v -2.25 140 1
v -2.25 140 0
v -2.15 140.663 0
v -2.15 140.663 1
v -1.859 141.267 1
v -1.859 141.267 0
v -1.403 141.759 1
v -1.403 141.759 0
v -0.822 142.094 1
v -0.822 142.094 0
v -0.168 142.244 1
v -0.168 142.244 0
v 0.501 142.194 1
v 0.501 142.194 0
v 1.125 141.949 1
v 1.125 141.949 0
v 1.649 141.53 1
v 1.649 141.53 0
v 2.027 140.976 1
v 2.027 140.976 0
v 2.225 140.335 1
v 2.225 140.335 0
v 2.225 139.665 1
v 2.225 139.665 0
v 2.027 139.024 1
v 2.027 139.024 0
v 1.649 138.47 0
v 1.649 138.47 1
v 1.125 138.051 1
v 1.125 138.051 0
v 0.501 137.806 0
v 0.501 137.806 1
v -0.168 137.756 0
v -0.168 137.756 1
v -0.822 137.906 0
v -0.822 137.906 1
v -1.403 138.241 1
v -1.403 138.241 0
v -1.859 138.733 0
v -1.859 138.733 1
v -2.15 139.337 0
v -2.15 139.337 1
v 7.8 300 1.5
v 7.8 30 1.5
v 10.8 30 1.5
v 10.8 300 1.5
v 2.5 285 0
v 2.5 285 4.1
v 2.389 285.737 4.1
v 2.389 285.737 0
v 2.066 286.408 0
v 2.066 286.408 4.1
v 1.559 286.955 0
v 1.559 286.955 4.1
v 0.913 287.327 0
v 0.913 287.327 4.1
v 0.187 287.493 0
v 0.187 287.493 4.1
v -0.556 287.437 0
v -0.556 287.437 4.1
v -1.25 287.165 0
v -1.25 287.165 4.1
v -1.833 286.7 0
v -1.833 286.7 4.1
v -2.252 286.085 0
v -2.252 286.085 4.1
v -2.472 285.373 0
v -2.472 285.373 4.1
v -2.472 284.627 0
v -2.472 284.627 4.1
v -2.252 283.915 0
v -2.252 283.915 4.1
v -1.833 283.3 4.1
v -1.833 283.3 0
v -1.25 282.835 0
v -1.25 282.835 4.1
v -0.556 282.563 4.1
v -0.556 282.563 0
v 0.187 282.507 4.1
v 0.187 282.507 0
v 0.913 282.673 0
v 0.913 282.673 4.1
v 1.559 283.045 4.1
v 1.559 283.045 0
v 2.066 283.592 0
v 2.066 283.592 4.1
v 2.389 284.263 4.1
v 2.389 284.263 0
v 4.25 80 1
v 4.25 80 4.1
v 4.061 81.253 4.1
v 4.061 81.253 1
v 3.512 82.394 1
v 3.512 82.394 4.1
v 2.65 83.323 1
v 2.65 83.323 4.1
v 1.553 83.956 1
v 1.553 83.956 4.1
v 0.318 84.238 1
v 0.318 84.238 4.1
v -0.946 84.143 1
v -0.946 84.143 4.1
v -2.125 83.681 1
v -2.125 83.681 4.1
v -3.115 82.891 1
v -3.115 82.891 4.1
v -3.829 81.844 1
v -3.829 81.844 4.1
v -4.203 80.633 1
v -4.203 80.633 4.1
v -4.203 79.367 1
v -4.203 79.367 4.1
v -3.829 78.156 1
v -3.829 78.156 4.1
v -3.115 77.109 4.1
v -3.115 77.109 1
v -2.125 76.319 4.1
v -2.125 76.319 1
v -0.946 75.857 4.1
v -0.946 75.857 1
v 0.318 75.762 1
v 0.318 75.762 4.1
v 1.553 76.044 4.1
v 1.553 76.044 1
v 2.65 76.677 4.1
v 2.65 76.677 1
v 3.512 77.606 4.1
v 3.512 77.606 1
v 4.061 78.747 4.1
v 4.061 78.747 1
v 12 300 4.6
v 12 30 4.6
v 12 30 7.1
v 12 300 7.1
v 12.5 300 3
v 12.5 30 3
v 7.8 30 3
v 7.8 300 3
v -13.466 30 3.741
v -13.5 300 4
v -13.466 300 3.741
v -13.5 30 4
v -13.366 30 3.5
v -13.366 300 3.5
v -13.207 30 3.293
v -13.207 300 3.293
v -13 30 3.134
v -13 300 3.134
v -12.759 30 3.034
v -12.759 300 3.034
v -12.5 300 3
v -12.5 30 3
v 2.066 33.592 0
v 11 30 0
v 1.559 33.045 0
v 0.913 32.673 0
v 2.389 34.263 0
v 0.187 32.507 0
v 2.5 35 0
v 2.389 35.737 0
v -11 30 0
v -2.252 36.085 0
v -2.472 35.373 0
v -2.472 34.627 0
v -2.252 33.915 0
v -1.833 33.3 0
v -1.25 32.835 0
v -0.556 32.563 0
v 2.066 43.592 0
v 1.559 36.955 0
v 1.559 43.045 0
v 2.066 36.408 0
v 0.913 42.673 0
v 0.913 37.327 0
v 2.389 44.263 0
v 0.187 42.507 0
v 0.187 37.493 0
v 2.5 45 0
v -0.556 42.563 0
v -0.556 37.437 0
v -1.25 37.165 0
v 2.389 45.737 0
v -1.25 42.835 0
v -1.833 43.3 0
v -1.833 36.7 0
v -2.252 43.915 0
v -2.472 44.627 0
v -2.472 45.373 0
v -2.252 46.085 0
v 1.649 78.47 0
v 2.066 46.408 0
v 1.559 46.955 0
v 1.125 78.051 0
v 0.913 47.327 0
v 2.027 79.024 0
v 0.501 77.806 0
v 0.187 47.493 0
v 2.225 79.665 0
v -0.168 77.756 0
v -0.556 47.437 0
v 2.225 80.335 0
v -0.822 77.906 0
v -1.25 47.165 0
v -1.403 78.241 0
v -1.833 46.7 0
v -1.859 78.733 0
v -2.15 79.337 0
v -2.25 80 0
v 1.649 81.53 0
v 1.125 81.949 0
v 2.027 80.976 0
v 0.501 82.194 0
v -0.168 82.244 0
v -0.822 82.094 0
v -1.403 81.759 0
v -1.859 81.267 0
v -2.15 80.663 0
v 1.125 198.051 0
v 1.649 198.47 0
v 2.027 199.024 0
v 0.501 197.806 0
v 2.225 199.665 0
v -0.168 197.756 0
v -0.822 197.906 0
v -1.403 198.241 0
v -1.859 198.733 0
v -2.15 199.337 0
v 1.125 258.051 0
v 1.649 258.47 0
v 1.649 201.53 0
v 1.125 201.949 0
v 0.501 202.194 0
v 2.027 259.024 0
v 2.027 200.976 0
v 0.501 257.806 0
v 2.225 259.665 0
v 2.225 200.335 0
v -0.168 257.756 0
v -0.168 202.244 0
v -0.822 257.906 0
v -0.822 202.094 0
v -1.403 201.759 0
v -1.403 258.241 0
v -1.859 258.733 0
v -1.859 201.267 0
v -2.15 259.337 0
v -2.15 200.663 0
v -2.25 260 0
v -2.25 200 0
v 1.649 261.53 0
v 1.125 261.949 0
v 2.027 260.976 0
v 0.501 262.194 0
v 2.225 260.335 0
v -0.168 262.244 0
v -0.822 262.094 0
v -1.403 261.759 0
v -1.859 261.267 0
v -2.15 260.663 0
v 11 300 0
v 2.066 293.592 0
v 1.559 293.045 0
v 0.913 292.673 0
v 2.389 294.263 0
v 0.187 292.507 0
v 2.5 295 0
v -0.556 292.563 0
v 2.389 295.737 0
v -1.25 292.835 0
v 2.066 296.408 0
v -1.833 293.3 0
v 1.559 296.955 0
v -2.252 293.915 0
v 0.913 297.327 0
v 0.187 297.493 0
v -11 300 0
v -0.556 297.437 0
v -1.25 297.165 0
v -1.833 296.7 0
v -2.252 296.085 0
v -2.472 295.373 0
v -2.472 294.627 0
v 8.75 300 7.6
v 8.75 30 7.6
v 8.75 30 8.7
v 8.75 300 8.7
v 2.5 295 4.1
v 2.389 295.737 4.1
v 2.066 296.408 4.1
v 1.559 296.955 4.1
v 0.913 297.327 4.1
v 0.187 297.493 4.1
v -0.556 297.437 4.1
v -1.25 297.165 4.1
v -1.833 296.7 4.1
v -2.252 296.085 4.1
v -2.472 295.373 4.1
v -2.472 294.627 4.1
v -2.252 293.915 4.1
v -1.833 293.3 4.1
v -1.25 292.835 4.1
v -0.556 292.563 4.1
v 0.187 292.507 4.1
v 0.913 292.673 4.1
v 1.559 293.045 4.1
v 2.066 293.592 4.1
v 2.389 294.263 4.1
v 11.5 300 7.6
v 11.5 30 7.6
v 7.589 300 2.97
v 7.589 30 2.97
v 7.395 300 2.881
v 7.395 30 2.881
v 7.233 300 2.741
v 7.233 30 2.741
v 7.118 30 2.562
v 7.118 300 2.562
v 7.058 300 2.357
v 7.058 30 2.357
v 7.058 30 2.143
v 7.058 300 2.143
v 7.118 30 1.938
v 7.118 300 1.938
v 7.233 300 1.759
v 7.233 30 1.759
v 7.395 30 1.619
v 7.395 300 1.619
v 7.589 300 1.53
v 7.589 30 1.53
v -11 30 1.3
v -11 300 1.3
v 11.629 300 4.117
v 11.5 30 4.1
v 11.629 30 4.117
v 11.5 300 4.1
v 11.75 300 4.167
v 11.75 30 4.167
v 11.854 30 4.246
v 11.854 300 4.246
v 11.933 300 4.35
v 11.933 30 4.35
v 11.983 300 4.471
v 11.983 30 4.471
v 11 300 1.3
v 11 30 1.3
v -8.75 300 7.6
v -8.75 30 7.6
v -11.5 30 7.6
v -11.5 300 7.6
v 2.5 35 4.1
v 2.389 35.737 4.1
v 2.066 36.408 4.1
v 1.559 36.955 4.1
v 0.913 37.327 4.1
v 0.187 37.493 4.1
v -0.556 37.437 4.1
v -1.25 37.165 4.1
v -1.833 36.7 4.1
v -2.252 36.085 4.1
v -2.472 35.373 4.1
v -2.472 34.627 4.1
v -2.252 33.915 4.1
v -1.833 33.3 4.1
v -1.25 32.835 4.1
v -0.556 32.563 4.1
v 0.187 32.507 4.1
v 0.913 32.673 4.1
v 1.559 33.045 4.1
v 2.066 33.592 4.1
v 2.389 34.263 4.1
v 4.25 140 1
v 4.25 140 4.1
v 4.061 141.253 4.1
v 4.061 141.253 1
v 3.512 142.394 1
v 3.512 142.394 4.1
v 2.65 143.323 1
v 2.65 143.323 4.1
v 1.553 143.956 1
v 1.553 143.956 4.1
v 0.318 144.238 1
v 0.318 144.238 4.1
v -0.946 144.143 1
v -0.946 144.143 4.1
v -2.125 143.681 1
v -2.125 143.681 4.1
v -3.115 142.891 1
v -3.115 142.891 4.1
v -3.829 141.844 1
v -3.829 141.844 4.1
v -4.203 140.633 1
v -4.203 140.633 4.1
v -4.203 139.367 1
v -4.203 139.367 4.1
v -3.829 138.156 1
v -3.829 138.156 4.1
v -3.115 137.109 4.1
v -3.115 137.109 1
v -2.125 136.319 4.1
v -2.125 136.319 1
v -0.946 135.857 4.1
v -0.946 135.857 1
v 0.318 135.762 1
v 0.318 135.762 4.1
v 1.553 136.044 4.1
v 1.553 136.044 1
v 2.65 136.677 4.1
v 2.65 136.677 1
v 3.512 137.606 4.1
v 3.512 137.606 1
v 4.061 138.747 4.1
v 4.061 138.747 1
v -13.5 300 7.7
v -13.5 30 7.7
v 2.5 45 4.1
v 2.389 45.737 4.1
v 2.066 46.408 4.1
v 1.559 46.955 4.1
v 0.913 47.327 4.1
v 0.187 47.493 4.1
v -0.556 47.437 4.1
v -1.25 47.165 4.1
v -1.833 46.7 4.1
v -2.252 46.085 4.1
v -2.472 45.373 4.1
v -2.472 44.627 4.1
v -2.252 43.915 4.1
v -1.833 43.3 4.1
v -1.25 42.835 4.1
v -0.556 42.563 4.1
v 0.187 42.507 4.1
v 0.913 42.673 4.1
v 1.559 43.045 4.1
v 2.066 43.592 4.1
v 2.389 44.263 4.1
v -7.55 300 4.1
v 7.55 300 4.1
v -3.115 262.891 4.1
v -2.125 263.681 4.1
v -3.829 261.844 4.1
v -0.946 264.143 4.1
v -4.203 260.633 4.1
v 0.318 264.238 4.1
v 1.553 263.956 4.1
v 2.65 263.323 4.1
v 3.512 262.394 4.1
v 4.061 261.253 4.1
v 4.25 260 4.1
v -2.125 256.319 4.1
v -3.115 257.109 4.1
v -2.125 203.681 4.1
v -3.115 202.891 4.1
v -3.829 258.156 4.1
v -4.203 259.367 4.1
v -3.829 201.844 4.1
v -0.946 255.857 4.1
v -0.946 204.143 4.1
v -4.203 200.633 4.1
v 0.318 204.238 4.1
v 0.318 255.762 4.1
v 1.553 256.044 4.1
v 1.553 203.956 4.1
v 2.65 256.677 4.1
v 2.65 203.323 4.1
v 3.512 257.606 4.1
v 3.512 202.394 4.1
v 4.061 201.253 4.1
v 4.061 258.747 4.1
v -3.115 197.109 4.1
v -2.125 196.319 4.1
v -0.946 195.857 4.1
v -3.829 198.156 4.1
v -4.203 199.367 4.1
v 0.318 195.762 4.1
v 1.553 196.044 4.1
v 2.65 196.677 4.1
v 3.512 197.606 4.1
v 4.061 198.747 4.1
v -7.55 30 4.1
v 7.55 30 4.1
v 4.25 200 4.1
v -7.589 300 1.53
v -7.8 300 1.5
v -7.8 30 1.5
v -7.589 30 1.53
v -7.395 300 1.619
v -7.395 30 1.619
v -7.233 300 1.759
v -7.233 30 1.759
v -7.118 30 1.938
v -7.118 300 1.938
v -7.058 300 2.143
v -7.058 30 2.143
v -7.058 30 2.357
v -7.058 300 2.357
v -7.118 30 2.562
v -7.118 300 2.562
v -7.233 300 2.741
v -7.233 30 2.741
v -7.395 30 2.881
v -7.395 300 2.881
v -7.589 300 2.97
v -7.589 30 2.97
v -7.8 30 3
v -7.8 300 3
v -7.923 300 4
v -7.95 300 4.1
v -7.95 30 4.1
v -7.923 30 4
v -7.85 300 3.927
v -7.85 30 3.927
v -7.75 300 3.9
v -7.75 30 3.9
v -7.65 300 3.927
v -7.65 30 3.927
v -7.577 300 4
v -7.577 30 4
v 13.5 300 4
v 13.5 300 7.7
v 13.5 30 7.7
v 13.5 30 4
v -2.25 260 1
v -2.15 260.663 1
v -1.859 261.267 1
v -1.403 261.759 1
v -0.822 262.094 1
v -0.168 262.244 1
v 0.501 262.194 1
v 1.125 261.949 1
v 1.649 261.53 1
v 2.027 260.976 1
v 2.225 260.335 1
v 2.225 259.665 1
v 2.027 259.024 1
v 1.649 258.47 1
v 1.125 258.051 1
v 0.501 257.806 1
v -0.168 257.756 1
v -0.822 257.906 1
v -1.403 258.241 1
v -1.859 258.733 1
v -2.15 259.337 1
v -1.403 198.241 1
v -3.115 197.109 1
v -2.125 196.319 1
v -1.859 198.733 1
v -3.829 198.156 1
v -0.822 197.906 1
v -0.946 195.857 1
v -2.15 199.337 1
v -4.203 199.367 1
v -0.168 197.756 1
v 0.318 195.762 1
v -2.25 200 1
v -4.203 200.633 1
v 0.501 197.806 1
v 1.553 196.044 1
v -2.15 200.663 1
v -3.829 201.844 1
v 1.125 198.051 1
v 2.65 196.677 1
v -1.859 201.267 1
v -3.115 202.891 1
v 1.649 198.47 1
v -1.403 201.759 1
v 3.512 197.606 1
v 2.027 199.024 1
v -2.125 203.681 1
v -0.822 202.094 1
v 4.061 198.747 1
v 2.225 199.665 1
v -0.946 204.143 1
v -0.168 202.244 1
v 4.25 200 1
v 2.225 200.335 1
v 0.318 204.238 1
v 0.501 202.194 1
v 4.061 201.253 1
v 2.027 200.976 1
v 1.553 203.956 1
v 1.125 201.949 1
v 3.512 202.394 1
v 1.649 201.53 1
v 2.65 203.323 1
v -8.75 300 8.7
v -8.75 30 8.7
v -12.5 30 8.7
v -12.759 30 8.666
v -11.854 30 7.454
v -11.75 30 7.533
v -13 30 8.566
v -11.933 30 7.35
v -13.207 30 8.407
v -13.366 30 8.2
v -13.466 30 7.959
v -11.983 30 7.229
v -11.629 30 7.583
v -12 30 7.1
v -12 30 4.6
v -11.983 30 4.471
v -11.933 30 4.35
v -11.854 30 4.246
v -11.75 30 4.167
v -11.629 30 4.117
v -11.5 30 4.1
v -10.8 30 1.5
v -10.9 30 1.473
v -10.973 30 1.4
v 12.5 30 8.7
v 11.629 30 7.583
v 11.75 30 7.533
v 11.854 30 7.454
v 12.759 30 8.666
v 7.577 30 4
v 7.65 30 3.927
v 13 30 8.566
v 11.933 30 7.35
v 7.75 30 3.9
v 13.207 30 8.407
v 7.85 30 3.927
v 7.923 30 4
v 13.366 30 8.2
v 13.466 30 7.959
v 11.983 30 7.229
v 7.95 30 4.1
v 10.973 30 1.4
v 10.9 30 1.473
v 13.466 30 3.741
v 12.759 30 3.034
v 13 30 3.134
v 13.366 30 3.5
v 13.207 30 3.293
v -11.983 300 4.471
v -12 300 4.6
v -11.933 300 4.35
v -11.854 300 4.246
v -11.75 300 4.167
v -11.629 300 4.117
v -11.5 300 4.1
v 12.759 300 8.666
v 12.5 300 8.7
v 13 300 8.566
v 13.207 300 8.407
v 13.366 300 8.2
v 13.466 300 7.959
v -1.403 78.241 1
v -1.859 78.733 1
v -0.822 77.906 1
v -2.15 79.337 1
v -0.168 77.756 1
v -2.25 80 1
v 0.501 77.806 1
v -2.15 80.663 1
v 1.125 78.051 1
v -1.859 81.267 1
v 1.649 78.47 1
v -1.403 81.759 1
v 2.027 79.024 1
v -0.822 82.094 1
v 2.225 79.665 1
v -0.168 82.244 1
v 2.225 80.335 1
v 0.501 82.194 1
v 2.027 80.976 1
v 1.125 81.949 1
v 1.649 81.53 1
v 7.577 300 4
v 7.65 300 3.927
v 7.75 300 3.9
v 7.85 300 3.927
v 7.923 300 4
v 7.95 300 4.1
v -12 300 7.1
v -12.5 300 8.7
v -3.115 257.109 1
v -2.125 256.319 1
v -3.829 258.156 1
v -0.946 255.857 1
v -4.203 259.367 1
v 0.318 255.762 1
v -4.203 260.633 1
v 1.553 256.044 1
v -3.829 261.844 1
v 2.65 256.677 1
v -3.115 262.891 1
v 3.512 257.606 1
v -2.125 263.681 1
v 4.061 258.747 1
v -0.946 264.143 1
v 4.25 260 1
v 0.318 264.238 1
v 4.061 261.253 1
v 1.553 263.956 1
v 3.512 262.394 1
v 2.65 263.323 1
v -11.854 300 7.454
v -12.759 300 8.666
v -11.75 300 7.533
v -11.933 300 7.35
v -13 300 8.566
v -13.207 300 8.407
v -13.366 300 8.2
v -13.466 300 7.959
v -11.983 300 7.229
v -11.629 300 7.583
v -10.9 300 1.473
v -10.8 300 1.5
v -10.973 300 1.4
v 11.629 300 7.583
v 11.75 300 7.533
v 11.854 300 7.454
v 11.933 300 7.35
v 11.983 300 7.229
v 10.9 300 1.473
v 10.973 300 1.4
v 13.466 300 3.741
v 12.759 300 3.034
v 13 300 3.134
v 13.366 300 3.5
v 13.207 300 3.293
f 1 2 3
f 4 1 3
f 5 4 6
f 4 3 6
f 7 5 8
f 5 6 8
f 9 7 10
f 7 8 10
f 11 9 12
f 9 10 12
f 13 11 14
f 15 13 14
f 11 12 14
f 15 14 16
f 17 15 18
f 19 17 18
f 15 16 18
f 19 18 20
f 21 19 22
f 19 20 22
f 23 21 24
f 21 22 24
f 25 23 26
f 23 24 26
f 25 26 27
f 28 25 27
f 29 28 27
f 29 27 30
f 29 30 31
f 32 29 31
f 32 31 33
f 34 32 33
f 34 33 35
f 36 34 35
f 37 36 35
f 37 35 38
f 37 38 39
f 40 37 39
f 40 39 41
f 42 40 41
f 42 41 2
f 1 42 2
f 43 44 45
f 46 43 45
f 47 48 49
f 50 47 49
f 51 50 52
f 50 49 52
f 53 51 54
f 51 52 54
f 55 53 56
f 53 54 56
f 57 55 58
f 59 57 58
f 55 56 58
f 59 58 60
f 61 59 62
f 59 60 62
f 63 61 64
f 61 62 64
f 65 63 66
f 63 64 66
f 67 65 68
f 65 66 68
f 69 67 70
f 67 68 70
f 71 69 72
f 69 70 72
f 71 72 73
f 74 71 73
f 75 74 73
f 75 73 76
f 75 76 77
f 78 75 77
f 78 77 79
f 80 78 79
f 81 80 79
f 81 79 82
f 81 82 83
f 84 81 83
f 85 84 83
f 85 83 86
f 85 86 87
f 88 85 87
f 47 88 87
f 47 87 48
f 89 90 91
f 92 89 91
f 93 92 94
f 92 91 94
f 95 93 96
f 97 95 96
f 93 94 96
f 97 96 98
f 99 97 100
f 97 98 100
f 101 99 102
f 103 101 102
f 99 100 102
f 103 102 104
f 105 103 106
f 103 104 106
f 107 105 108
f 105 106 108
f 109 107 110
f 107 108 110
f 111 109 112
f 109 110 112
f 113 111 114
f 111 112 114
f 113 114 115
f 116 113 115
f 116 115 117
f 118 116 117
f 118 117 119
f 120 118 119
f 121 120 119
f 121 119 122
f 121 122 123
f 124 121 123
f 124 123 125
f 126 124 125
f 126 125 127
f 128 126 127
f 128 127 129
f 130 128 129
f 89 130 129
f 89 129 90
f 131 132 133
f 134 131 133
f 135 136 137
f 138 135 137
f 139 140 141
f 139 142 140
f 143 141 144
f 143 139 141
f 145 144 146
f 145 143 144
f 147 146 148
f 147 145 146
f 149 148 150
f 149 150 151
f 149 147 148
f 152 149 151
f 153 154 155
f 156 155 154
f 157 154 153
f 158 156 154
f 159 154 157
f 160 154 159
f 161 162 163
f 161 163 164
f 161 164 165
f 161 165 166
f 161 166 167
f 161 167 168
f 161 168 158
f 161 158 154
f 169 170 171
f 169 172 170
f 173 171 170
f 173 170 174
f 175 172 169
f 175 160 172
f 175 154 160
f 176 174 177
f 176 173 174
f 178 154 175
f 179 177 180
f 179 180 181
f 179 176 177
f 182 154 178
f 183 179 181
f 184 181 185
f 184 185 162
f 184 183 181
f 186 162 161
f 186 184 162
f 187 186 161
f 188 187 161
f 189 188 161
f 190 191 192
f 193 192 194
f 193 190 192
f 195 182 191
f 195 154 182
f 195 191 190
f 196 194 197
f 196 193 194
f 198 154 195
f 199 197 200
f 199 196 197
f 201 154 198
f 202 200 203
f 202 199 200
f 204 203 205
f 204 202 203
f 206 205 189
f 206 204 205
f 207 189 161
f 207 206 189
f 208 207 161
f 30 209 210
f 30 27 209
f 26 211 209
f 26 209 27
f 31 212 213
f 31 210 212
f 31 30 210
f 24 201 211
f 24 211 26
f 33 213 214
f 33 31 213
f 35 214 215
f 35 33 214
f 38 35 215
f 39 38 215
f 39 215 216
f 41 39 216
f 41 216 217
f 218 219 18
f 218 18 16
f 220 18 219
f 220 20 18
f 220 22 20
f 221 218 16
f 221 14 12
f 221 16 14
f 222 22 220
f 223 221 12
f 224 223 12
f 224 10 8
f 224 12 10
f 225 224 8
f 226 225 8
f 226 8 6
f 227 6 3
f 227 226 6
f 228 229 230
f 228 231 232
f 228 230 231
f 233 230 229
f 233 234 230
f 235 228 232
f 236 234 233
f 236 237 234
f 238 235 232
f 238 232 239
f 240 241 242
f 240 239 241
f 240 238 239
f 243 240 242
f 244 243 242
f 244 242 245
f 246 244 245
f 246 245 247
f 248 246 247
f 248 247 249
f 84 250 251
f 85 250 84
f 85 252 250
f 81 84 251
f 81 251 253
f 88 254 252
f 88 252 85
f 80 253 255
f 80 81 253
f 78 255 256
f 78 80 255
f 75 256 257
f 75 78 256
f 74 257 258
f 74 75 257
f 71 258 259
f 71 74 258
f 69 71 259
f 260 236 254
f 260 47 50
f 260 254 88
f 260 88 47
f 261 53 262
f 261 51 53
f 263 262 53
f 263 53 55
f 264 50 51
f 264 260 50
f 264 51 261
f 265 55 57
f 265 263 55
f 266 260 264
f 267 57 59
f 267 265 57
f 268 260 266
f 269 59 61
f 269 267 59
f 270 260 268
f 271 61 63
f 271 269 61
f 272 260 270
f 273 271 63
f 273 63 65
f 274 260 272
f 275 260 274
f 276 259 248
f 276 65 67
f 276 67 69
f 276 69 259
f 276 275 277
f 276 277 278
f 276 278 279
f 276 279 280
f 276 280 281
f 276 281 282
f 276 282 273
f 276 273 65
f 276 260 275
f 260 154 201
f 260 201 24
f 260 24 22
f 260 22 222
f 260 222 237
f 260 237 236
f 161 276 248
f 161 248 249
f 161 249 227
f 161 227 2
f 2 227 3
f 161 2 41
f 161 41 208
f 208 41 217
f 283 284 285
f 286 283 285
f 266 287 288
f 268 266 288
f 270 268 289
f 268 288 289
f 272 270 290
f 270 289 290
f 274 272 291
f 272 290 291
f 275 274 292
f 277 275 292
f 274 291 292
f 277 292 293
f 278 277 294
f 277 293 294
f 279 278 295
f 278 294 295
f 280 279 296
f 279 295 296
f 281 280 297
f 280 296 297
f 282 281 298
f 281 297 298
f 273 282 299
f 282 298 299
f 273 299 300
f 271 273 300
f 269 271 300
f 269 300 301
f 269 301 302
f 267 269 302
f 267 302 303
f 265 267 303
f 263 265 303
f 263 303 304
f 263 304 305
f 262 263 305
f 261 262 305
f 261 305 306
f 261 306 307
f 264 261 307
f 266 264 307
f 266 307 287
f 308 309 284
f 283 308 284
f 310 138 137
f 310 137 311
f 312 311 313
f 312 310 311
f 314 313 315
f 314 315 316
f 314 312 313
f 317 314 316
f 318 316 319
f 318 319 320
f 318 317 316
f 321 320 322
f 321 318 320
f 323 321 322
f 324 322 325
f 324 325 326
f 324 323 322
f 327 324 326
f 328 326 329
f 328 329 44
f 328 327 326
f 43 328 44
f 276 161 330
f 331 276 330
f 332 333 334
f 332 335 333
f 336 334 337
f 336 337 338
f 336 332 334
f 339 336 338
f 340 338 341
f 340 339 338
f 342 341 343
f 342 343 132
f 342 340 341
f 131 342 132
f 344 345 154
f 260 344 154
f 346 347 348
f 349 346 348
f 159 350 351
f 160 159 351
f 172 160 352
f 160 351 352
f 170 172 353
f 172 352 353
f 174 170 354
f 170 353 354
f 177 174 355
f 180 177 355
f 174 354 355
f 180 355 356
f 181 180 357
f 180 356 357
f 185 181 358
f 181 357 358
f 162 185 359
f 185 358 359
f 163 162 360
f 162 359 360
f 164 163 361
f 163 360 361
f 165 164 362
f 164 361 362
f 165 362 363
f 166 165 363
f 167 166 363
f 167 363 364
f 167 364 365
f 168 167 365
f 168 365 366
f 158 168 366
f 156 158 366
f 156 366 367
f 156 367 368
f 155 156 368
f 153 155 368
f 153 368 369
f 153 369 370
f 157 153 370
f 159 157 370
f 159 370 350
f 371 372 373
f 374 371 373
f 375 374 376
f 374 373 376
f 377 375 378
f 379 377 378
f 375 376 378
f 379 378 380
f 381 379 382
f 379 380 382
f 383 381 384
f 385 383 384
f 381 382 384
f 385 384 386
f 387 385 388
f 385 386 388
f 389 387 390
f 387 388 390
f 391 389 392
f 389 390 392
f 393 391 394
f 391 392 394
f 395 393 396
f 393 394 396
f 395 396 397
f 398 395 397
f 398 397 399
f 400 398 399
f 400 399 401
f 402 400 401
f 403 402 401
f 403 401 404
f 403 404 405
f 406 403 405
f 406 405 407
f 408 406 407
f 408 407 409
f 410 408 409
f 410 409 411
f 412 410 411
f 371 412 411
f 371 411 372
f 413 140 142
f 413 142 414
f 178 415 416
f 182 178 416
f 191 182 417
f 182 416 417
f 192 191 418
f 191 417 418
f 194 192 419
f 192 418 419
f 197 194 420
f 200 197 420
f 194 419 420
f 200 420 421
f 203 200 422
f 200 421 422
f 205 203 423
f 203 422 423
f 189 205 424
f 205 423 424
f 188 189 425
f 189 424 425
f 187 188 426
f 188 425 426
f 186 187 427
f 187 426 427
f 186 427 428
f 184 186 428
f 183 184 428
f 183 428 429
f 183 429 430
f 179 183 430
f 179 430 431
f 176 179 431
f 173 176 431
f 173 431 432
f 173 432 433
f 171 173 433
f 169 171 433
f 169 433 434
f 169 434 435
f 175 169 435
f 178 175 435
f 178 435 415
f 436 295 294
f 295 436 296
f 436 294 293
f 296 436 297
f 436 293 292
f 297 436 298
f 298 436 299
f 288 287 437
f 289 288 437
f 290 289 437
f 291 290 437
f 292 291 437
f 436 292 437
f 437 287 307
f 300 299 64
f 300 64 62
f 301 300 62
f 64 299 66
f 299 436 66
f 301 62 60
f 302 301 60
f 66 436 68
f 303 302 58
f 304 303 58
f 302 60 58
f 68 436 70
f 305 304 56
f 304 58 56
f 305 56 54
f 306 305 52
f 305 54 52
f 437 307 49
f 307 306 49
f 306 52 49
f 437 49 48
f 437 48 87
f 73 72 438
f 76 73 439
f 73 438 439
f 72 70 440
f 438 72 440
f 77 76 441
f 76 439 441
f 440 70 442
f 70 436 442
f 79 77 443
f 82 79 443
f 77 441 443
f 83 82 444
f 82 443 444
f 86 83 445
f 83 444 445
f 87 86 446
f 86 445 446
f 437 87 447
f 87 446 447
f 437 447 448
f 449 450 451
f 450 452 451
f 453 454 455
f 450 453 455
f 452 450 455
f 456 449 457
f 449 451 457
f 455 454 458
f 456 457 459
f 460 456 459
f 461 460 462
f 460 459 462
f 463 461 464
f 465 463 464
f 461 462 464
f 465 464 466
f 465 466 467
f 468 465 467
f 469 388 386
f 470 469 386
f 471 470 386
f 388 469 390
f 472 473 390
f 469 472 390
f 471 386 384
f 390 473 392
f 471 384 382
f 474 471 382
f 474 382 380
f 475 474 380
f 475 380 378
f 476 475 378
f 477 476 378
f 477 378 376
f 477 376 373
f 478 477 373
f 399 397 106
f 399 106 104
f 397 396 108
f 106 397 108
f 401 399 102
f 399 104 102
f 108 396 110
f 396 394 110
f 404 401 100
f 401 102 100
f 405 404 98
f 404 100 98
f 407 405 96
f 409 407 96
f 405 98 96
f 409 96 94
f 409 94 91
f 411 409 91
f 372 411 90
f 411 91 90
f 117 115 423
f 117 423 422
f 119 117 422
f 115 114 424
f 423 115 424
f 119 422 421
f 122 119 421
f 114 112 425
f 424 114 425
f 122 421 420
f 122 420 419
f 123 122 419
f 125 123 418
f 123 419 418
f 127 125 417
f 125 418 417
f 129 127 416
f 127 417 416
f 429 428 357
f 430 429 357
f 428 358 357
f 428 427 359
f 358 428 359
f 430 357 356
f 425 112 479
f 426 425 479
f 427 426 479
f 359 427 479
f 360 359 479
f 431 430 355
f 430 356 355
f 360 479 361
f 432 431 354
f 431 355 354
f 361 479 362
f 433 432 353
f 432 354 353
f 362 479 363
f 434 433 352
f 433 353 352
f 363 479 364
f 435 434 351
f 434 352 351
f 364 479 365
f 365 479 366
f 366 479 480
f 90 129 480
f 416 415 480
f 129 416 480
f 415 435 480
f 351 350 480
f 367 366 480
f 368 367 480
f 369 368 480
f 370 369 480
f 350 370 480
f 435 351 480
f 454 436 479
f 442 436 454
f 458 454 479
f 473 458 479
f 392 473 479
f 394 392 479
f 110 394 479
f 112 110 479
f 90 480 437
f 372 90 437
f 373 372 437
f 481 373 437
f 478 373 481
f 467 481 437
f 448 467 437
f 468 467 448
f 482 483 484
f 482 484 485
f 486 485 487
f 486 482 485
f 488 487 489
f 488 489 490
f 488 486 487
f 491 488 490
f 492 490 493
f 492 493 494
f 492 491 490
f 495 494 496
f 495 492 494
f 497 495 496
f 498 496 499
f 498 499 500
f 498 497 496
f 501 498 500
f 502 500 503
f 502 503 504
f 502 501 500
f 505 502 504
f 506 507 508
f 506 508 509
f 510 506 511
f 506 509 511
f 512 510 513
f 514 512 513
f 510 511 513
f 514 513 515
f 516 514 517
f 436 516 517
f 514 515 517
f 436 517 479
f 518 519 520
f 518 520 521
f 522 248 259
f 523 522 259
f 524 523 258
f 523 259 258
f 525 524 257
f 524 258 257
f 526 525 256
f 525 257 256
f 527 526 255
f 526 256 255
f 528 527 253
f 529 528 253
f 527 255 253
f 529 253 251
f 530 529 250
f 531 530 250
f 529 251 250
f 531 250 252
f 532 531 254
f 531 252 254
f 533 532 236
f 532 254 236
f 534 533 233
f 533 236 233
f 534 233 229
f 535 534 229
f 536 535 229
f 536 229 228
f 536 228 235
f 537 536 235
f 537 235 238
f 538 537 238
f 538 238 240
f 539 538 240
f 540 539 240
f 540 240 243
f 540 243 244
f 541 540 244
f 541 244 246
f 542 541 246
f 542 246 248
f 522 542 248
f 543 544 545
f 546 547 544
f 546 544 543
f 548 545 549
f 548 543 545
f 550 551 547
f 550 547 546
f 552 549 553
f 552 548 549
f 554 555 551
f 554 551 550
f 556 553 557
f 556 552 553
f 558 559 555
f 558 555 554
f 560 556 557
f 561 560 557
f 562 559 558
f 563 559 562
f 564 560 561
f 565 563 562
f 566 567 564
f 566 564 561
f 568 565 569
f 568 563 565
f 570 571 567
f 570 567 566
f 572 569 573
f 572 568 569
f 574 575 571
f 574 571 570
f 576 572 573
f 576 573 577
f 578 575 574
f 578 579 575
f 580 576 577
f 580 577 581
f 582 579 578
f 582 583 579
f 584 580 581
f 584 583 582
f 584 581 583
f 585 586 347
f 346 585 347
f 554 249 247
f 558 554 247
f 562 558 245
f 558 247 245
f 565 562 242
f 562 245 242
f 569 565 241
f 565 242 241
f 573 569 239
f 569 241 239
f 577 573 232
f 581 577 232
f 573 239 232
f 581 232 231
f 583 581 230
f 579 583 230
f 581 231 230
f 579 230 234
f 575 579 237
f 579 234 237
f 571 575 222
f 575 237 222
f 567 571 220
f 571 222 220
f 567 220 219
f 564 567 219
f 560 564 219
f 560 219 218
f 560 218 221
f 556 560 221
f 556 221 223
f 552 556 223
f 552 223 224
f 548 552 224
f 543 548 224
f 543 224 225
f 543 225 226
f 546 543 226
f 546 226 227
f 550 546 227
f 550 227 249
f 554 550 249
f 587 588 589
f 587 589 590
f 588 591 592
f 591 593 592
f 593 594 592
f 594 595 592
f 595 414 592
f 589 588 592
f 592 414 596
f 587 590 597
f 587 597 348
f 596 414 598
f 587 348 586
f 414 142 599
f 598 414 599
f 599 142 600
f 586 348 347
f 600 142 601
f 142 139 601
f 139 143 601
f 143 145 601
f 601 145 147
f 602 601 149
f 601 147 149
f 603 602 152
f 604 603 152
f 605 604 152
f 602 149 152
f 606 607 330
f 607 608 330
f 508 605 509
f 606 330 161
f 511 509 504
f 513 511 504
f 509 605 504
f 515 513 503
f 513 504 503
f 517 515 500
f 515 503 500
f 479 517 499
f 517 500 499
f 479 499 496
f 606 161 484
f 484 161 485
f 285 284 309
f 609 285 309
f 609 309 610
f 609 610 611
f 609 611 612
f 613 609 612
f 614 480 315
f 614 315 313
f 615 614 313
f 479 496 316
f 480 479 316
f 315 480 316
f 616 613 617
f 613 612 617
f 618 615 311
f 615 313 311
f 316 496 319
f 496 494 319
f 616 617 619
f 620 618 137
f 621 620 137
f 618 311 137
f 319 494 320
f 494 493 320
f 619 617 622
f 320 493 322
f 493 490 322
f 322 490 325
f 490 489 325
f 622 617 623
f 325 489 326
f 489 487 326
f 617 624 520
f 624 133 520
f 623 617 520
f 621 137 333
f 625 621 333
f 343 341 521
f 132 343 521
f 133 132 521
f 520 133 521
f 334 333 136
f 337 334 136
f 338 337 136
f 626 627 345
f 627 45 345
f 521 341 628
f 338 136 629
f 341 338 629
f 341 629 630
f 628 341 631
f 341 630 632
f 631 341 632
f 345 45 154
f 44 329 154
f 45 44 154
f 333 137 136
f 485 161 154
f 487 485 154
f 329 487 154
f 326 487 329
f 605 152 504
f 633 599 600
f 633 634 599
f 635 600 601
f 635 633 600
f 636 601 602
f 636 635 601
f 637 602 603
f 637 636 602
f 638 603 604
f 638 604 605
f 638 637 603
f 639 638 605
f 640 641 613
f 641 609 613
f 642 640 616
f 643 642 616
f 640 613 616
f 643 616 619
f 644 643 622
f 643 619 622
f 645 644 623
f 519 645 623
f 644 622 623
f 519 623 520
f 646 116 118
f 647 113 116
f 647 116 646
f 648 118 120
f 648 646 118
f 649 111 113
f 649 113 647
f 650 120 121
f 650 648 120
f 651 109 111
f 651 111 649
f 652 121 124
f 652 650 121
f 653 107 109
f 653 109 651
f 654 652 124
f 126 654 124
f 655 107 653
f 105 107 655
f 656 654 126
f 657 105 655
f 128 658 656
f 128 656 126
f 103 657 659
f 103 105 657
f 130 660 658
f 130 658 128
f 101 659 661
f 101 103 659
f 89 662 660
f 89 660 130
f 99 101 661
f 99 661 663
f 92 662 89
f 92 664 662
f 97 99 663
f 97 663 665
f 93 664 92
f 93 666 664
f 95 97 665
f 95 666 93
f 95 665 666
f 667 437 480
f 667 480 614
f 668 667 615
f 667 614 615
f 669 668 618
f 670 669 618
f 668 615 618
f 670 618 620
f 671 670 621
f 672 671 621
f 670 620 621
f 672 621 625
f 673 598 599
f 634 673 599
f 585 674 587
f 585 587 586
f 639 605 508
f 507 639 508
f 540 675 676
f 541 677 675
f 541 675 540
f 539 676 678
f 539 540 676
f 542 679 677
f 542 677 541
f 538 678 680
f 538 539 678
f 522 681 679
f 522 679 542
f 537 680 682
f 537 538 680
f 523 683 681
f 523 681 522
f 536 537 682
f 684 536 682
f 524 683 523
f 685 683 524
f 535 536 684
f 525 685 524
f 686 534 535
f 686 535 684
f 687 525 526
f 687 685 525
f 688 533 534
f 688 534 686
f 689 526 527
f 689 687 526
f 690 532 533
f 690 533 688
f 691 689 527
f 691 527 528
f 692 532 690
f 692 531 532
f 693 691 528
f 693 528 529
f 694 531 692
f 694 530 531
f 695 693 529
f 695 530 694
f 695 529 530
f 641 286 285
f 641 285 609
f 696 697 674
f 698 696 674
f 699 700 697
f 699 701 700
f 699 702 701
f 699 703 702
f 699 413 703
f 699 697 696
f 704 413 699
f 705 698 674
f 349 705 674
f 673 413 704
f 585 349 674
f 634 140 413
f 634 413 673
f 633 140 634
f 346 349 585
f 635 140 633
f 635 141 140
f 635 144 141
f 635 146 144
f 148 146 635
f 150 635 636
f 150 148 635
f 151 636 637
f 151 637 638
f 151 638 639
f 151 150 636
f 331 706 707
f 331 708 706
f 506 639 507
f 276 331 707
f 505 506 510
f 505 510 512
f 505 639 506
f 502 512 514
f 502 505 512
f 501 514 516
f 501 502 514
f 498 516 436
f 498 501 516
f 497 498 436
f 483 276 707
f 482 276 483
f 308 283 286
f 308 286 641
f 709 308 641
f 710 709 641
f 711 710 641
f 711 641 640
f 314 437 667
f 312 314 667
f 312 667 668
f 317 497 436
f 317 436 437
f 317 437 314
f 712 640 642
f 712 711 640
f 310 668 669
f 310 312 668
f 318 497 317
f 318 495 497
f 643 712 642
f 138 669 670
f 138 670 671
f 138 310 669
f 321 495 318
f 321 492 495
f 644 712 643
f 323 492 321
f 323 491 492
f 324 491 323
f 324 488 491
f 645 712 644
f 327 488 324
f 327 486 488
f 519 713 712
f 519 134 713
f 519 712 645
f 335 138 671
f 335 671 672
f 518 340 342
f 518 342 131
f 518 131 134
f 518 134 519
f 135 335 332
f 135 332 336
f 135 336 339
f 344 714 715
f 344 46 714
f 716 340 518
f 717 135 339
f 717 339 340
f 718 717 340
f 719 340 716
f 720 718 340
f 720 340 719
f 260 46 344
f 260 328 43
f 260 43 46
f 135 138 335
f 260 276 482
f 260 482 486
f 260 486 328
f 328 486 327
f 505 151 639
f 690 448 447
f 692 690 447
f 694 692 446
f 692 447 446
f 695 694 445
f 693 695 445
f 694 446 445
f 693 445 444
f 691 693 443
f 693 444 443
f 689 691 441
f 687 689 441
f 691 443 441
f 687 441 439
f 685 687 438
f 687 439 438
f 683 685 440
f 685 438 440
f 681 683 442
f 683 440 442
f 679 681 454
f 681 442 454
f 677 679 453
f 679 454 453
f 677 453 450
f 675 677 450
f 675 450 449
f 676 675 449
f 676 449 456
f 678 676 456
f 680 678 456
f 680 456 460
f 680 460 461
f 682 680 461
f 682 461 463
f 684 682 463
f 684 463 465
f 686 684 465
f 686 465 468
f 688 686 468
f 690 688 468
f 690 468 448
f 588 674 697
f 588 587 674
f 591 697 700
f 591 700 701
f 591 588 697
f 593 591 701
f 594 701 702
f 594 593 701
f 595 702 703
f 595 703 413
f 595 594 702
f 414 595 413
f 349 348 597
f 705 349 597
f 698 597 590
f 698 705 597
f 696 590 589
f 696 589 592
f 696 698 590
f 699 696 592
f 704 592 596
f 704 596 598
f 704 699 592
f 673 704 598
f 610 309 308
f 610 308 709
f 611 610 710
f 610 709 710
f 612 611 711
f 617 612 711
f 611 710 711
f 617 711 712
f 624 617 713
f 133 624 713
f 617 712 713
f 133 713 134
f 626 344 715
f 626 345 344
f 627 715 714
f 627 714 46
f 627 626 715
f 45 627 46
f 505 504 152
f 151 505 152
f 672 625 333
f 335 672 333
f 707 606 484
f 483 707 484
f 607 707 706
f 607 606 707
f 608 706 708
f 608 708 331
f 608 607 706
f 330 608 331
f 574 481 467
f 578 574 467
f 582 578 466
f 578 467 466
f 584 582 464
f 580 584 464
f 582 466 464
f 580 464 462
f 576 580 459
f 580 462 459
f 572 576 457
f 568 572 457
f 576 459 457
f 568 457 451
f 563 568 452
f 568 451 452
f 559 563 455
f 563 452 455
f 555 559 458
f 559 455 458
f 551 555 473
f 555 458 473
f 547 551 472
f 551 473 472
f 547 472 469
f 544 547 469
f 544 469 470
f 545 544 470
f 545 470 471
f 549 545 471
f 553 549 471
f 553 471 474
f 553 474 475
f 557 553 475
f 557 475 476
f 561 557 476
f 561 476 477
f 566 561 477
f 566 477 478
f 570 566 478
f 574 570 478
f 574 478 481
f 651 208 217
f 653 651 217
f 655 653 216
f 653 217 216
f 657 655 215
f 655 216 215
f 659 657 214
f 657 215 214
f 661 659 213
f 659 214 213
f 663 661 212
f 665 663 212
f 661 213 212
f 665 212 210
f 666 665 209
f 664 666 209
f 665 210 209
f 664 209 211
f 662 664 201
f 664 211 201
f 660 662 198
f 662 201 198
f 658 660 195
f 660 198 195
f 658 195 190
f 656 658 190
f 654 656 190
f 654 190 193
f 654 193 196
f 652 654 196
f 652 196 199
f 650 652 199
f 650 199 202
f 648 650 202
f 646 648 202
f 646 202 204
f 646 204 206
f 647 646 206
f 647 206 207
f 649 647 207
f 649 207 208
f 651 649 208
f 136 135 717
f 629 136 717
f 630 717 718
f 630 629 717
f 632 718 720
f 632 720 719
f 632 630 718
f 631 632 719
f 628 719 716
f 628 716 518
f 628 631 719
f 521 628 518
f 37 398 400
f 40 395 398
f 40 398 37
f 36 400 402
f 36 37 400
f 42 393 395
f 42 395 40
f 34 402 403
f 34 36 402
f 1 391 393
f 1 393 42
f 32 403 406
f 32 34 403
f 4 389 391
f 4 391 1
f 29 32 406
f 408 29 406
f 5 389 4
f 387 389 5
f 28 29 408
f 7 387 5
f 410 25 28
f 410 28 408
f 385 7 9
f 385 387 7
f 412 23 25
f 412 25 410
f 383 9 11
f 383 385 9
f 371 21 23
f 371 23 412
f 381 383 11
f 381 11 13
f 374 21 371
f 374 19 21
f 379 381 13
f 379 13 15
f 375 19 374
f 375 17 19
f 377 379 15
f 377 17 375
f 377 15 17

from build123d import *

# Parameters (mm, degrees)
BOSS_EXTRUDE1_DEPTH                              = 270
CUT_EXTRUDE1_DEPTH                               = 271.477244884
F_0_4_0_4_DIAMETER_HOLE1_D                       = 0.4
CBORE_FOR_M4_HEX_HEAD_MACHINE_SCREW1_D           = 4.5
CBORE_FOR_M4_HEX_HEAD_MACHINE_SCREW1_DEPTH       = 4.1
CBORE_FOR_M4_HEX_HEAD_MACHINE_SCREW1_CBORE_D     = 8.5
CBORE_FOR_M4_HEX_HEAD_MACHINE_SCREW1_CBORE_DEPTH = 3.1
FILLET1_R                                        = 0.2
FILLET2_R                                        = 0.5
FILLET3_R                                        = 1
CUT_EXTRUDE2_REACH                               = 302.339
SKETCH7_R                                        = 2.5


with BuildPart() as part:
    # Sketch1 → Boss-Extrude1 (new body)
    with BuildSketch(Plane(origin=(0, 300, 0), x_dir=(1, 0, 0), z_dir=(0, 1, 0))):
        with BuildLine():
            Line((-13.5, -3), (-13.5, -8.7))
            Line((-13.5, -8.7), (13.5, -8.7))
            Line((13.5, -8.7), (13.5, -3))
            Line((13.5, -3), (7.8, -3))
            ThreePointArc((7.8, -3), (7.05, -2.25), (7.8, -1.5))
            Line((7.8, -1.5), (11, -1.5))
            Line((11, -1.5), (11, 0))
            Line((11, 0), (-11, 0))
            Line((-11, 0), (-11, -1.5))
            Line((-11, -1.5), (-7.8, -1.5))
            ThreePointArc((-7.8, -1.5), (-7.05, -2.25), (-7.8, -3))
            Line((-7.8, -3), (-13.5, -3))
        make_face()
    extrude(amount=-BOSS_EXTRUDE1_DEPTH)

    # Sketch2 → Cut-Extrude1 (cut, through all)
    with BuildSketch(Plane.XZ.offset(-30)):
        Polygon((8.75, 8.7), (-8.75, 8.7), (-8.75, 7.6), (-12, 7.6), (-12, 4.1), (12, 4.1), (12, 7.6), (8.75, 7.6), align=None)
    extrude(amount=-CUT_EXTRUDE1_DEPTH, mode=Mode.SUBTRACT)

    # Ø0.4 (0.4) Diameter Hole1 (through all)
    with Locations(Plane(origin=(0, 300, 0), x_dir=(1, 0, 0), z_dir=(0, 1, 0))):
        with Locations((-7.75, -4.1), (7.75, -4.1)):
            Hole(F_0_4_0_4_DIAMETER_HOLE1_D / 2)

    # CBORE for M4 Hex Head Machine Screw1
    with Locations(Plane.XY.offset(4.1)):
        with Locations((0, 260), (0, 200), (0, 140), (0, 80), (0, 20)):
            CounterBoreHole(CBORE_FOR_M4_HEX_HEAD_MACHINE_SCREW1_D / 2, CBORE_FOR_M4_HEX_HEAD_MACHINE_SCREW1_CBORE_D / 2, CBORE_FOR_M4_HEX_HEAD_MACHINE_SCREW1_CBORE_DEPTH, depth=CBORE_FOR_M4_HEX_HEAD_MACHINE_SCREW1_DEPTH)

    # Fillet1
    fillet1_edges = [part.edges().sort_by_distance(p)[0] for p in [
        (-11, 165, 1.5),
        (11, 165, 1.5),
    ]]
    fillet(fillet1_edges, radius=FILLET1_R)

    # Fillet2
    fillet2_edges = [part.edges().sort_by_distance(p)[0] for p in [
        (12, 165, 7.6),
        (12, 165, 4.1),
        (-12, 165, 4.1),
        (-12, 165, 7.6),
    ]]
    fillet(fillet2_edges, radius=FILLET2_R)

    # Fillet3
    fillet3_edges = [part.edges().sort_by_distance(p)[0] for p in [
        (13.5, 165, 3),
        (13.5, 165, 8.7),
        (-13.5, 165, 8.7),
        (-13.5, 165, 3),
    ]]
    fillet(fillet3_edges, radius=FILLET3_R)

    # Sketch7 → Cut-Extrude2 (cut, up to next)
    with BuildSketch(Plane.XY.offset(4.1), mode=Mode.PRIVATE) as cut_extrude2_sk1:
        with Locations((0, 285)):
            Circle(SKETCH7_R)
    cut_extrude2_tool1 = extrude(cut_extrude2_sk1.sketch, amount=-CUT_EXTRUDE2_REACH, mode=Mode.PRIVATE) & part.part
    # Sketch7 → Cut-Extrude2 (cut, up to next)
    with BuildSketch(Plane.XY.offset(4.1), mode=Mode.PRIVATE) as cut_extrude2_sk2:
        with Locations((0, 45)):
            Circle(SKETCH7_R)
    cut_extrude2_tool2 = extrude(cut_extrude2_sk2.sketch, amount=-CUT_EXTRUDE2_REACH, mode=Mode.PRIVATE) & part.part
    # Sketch7 → Cut-Extrude2 (cut, up to next)
    with BuildSketch(Plane.XY.offset(4.1), mode=Mode.PRIVATE) as cut_extrude2_sk3:
        with Locations((0, 35)):
            Circle(SKETCH7_R)
    cut_extrude2_tool3 = extrude(cut_extrude2_sk3.sketch, amount=-CUT_EXTRUDE2_REACH, mode=Mode.PRIVATE) & part.part
    # Sketch7 → Cut-Extrude2 (cut, up to next)
    with BuildSketch(Plane.XY.offset(4.1), mode=Mode.PRIVATE) as cut_extrude2_sk4:
        with Locations((0, 295)):
            Circle(SKETCH7_R)
    cut_extrude2_tool4 = extrude(cut_extrude2_sk4.sketch, amount=-CUT_EXTRUDE2_REACH, mode=Mode.PRIVATE) & part.part
    add(cut_extrude2_tool1.solids().sort_by_distance((0, 285, 4.1))[0], mode=Mode.SUBTRACT)
    add(cut_extrude2_tool2.solids().sort_by_distance((0, 45, 4.1))[0], mode=Mode.SUBTRACT)
    add(cut_extrude2_tool3.solids().sort_by_distance((0, 35, 4.1))[0], mode=Mode.SUBTRACT)
    add(cut_extrude2_tool4.solids().sort_by_distance((0, 295, 4.1))[0], mode=Mode.SUBTRACT)


solid = part.part
